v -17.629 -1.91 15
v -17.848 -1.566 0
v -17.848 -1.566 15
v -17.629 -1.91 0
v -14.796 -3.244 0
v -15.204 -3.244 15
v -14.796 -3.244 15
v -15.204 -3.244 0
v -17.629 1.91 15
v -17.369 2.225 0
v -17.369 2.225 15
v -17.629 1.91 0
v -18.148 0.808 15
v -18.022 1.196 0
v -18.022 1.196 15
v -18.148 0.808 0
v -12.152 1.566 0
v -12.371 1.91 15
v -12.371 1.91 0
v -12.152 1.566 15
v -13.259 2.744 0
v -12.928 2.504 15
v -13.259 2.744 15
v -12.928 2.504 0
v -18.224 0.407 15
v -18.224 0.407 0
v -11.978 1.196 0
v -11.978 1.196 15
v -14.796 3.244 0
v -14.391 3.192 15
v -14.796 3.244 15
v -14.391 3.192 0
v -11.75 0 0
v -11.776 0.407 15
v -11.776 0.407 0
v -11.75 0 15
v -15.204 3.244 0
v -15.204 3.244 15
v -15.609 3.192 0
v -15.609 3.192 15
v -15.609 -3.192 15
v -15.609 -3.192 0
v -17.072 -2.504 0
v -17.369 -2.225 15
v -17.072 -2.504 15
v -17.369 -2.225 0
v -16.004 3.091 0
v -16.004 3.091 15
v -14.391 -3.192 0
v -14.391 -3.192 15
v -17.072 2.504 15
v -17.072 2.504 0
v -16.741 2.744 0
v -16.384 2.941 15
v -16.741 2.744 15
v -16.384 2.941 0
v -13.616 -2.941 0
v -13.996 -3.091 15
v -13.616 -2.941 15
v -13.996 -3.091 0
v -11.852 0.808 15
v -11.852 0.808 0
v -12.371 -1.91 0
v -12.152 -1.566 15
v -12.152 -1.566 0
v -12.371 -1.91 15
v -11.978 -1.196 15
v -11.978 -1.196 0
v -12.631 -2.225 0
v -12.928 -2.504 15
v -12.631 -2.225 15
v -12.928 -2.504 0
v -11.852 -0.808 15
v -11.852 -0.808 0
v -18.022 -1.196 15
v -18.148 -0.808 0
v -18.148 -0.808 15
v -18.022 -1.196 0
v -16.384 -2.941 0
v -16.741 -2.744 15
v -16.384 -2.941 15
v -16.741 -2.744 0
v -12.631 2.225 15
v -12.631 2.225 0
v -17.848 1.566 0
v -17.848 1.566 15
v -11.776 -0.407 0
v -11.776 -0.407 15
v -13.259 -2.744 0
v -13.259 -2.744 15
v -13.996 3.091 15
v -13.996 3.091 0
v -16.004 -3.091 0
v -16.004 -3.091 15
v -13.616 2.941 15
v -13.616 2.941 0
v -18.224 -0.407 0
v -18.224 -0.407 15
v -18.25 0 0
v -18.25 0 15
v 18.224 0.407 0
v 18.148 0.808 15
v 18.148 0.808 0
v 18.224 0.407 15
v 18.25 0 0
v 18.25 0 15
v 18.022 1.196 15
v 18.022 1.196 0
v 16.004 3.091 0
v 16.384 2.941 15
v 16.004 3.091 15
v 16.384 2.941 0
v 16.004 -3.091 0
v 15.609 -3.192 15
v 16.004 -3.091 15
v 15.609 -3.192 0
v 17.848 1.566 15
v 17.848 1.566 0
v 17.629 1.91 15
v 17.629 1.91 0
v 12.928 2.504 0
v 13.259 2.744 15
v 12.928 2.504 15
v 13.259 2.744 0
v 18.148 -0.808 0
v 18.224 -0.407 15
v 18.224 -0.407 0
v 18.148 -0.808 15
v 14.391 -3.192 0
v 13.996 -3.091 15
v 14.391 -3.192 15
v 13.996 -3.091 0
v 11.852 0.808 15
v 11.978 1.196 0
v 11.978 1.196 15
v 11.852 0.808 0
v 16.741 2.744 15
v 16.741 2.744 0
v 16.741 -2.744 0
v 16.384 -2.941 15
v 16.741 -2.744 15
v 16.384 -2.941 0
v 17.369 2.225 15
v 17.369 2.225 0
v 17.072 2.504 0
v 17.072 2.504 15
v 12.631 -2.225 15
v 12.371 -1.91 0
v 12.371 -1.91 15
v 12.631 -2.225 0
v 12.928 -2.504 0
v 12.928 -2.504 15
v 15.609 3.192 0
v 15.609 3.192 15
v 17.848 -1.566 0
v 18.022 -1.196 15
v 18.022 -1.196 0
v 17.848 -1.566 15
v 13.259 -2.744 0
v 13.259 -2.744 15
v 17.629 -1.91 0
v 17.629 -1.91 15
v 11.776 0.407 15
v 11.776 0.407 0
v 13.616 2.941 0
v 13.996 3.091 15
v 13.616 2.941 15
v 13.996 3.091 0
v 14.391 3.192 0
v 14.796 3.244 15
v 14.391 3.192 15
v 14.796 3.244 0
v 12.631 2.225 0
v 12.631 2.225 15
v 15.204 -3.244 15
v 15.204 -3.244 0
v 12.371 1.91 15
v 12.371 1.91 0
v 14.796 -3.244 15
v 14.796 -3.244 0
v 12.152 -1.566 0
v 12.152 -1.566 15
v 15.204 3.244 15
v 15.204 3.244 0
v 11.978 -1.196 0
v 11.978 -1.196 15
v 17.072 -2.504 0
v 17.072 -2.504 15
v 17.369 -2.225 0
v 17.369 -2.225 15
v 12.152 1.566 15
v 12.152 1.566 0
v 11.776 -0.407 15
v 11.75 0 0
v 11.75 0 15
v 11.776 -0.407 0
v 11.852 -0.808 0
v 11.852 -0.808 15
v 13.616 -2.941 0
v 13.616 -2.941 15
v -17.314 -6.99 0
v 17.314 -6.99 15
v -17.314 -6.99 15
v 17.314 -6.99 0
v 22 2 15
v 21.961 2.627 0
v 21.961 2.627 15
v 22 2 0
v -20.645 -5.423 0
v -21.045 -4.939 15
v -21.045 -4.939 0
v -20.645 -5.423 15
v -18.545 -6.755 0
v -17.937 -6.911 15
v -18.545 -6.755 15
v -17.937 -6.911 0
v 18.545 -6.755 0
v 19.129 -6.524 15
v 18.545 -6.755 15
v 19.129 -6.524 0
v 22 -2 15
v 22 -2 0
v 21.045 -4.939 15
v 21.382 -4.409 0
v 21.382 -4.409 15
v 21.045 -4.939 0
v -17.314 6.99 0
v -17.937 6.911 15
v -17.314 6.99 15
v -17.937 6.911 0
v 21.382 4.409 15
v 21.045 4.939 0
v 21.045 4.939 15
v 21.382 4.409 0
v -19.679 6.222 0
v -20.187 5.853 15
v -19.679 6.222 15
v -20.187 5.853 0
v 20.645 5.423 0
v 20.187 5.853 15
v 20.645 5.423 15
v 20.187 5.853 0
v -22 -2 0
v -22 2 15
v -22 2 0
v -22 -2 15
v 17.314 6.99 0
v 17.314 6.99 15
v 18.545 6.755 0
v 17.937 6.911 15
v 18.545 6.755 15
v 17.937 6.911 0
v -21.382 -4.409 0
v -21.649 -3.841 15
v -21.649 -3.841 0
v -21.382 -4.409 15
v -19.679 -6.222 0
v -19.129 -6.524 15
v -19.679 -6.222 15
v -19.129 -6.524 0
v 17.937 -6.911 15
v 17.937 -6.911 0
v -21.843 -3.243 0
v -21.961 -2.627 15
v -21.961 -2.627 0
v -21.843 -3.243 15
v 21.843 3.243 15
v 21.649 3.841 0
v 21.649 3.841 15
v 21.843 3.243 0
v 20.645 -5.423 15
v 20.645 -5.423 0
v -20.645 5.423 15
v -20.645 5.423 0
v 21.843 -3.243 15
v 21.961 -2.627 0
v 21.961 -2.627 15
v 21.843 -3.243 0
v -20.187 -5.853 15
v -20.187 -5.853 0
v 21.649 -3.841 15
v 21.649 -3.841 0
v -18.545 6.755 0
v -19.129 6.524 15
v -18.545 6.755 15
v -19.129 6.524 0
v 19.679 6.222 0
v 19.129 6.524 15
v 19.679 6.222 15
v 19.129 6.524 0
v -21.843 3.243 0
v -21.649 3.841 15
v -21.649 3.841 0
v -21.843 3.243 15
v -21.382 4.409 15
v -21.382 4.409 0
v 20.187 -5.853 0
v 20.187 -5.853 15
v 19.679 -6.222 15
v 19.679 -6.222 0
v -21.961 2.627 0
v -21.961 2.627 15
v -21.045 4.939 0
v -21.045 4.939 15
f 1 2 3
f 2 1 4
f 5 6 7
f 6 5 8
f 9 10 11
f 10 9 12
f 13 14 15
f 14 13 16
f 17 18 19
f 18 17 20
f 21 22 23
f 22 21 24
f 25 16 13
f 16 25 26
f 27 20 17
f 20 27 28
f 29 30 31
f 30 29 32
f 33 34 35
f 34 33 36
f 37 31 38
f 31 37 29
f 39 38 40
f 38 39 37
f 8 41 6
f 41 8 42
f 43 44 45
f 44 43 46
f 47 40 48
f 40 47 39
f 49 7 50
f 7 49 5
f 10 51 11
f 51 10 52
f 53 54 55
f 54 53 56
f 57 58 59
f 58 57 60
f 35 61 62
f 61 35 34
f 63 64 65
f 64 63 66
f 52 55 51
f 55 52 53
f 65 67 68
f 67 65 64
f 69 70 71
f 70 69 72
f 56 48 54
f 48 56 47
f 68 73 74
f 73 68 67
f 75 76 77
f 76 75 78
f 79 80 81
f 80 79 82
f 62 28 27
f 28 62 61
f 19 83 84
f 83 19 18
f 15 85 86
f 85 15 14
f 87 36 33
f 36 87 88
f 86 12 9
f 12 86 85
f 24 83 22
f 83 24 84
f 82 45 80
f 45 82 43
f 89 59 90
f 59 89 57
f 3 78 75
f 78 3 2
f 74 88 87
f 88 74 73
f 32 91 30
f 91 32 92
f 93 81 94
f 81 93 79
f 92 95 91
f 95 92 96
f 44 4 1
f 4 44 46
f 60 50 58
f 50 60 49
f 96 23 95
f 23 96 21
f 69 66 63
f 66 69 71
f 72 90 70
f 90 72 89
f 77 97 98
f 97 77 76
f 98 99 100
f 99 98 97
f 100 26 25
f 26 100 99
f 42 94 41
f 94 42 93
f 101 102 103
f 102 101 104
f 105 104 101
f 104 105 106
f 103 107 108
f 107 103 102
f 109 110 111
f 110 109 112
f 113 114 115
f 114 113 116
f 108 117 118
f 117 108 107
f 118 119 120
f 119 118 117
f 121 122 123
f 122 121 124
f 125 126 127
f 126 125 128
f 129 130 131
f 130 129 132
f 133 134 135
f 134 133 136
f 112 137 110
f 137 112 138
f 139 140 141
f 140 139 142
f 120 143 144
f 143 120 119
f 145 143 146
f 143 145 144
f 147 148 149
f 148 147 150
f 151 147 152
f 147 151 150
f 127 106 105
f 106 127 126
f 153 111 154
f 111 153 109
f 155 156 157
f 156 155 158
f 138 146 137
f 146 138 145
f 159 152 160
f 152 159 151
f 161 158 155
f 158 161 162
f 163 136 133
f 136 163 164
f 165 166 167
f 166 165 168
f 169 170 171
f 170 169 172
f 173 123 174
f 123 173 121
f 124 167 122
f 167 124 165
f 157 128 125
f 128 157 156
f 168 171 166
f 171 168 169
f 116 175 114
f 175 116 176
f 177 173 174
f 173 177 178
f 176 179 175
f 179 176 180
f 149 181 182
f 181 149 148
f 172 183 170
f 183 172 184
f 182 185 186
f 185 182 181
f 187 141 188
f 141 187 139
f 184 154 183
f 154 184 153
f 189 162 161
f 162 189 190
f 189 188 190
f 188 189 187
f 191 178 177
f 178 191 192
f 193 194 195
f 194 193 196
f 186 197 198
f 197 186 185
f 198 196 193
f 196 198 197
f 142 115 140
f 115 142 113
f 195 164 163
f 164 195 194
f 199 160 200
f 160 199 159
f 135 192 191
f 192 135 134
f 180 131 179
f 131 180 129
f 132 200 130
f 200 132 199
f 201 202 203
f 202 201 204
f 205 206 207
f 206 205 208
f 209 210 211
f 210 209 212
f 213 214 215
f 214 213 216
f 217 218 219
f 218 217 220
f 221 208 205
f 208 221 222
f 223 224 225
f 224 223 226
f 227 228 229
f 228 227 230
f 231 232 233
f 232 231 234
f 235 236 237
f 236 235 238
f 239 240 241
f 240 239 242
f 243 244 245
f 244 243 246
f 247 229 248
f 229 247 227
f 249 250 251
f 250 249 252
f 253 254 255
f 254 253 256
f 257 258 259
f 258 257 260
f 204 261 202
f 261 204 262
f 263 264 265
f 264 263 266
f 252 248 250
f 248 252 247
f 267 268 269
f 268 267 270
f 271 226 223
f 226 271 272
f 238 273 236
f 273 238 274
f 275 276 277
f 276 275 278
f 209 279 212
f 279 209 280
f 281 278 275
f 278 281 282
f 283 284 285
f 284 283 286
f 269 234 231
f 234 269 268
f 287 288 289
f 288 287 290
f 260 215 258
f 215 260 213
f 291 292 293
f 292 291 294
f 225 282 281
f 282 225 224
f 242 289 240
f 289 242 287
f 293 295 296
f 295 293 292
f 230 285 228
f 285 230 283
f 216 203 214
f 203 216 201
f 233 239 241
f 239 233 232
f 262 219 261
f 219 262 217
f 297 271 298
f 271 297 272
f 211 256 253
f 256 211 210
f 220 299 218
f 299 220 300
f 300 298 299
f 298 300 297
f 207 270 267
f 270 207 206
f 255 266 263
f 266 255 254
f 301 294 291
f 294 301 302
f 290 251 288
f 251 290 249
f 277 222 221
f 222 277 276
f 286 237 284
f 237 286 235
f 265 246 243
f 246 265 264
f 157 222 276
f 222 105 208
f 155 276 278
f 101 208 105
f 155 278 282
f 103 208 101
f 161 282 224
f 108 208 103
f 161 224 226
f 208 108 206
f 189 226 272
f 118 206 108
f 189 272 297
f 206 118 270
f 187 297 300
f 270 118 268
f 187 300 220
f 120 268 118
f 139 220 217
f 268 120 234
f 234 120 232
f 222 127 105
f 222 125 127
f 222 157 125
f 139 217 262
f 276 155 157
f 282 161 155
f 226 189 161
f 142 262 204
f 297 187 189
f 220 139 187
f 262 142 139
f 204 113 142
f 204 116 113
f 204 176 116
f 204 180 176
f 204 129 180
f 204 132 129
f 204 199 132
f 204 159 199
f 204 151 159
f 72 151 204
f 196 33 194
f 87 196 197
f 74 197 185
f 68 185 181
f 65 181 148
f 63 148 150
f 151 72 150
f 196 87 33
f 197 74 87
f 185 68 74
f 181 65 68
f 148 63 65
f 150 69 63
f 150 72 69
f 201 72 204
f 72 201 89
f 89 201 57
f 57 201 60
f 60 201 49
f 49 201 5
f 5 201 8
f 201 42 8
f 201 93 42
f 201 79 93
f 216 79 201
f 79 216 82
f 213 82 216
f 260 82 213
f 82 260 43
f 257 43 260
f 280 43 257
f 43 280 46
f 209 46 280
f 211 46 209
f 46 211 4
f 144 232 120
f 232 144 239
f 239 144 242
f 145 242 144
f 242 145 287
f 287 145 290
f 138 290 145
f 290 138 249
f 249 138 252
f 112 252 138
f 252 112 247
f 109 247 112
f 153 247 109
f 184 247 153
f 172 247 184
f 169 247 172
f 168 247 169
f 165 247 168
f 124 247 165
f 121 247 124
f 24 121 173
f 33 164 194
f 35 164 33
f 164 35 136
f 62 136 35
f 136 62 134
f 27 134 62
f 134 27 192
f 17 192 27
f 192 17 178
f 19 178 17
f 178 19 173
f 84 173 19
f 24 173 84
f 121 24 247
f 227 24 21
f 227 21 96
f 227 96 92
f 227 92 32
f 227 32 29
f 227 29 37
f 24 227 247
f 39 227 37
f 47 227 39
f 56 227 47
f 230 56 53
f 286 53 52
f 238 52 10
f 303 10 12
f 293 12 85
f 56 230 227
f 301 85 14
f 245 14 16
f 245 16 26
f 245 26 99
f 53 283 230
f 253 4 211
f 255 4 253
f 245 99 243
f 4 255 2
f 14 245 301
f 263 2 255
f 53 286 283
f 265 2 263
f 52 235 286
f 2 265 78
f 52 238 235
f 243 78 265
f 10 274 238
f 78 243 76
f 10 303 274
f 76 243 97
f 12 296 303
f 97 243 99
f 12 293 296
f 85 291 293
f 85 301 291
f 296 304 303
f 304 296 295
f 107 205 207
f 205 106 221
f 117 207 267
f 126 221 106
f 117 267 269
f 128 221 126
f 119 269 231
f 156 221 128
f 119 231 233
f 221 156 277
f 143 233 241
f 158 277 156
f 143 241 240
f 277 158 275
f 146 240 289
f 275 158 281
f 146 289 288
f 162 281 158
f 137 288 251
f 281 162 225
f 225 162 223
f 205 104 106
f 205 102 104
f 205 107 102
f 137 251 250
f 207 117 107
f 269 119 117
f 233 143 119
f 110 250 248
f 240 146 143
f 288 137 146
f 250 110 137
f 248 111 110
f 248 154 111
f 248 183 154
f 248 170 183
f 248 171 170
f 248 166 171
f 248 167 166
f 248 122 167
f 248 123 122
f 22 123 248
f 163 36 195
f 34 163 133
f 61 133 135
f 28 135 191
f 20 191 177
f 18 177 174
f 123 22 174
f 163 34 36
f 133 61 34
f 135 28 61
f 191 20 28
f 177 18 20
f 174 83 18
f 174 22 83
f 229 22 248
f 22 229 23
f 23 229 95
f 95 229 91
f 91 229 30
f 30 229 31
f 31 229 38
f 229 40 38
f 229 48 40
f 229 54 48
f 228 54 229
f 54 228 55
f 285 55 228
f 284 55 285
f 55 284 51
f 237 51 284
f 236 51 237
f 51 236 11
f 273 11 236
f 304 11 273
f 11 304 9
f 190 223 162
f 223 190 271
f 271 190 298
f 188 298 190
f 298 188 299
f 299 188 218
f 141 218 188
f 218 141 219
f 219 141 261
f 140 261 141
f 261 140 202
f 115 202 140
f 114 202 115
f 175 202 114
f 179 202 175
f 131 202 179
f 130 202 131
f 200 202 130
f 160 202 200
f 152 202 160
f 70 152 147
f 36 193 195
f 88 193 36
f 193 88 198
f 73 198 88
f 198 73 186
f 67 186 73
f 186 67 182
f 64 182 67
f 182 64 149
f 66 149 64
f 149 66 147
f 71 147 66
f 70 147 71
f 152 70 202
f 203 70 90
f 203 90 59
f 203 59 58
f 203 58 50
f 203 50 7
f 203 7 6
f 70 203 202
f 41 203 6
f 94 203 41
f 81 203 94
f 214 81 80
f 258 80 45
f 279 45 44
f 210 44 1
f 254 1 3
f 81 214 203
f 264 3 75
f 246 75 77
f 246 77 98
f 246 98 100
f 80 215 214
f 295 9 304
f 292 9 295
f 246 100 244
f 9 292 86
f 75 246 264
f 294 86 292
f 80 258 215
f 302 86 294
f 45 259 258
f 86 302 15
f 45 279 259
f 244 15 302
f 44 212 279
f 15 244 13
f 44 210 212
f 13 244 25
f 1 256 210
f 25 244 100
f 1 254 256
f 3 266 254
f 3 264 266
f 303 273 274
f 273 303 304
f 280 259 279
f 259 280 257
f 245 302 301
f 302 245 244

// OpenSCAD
$fn = 50;


difference() {
	union() {
		hull() {
			translate(v = [-17.0000000000, 2.0000000000, 0]) {
				cylinder(h = 15, r = 5);
			}
			translate(v = [17.0000000000, 2.0000000000, 0]) {
				cylinder(h = 15, r = 5);
			}
			translate(v = [-17.0000000000, -2.0000000000, 0]) {
				cylinder(h = 15, r = 5);
			}
			translate(v = [17.0000000000, -2.0000000000, 0]) {
				cylinder(h = 15, r = 5);
			}
		}
	}
	union() {
		translate(v = [-15.0000000000, 0.0000000000, -100.0000000000]) {
			cylinder(h = 200, r = 3.2500000000);
		}
		translate(v = [-15.0000000000, 0.0000000000, -100.0000000000]) {
			cylinder(h = 200, r = 3.2500000000);
		}
		translate(v = [15.0000000000, 0.0000000000, -100.0000000000]) {
			cylinder(h = 200, r = 3.2500000000);
		}
		translate(v = [15.0000000000, 0.0000000000, -100.0000000000]) {
			cylinder(h = 200, r = 3.2500000000);
		}
	}
}
